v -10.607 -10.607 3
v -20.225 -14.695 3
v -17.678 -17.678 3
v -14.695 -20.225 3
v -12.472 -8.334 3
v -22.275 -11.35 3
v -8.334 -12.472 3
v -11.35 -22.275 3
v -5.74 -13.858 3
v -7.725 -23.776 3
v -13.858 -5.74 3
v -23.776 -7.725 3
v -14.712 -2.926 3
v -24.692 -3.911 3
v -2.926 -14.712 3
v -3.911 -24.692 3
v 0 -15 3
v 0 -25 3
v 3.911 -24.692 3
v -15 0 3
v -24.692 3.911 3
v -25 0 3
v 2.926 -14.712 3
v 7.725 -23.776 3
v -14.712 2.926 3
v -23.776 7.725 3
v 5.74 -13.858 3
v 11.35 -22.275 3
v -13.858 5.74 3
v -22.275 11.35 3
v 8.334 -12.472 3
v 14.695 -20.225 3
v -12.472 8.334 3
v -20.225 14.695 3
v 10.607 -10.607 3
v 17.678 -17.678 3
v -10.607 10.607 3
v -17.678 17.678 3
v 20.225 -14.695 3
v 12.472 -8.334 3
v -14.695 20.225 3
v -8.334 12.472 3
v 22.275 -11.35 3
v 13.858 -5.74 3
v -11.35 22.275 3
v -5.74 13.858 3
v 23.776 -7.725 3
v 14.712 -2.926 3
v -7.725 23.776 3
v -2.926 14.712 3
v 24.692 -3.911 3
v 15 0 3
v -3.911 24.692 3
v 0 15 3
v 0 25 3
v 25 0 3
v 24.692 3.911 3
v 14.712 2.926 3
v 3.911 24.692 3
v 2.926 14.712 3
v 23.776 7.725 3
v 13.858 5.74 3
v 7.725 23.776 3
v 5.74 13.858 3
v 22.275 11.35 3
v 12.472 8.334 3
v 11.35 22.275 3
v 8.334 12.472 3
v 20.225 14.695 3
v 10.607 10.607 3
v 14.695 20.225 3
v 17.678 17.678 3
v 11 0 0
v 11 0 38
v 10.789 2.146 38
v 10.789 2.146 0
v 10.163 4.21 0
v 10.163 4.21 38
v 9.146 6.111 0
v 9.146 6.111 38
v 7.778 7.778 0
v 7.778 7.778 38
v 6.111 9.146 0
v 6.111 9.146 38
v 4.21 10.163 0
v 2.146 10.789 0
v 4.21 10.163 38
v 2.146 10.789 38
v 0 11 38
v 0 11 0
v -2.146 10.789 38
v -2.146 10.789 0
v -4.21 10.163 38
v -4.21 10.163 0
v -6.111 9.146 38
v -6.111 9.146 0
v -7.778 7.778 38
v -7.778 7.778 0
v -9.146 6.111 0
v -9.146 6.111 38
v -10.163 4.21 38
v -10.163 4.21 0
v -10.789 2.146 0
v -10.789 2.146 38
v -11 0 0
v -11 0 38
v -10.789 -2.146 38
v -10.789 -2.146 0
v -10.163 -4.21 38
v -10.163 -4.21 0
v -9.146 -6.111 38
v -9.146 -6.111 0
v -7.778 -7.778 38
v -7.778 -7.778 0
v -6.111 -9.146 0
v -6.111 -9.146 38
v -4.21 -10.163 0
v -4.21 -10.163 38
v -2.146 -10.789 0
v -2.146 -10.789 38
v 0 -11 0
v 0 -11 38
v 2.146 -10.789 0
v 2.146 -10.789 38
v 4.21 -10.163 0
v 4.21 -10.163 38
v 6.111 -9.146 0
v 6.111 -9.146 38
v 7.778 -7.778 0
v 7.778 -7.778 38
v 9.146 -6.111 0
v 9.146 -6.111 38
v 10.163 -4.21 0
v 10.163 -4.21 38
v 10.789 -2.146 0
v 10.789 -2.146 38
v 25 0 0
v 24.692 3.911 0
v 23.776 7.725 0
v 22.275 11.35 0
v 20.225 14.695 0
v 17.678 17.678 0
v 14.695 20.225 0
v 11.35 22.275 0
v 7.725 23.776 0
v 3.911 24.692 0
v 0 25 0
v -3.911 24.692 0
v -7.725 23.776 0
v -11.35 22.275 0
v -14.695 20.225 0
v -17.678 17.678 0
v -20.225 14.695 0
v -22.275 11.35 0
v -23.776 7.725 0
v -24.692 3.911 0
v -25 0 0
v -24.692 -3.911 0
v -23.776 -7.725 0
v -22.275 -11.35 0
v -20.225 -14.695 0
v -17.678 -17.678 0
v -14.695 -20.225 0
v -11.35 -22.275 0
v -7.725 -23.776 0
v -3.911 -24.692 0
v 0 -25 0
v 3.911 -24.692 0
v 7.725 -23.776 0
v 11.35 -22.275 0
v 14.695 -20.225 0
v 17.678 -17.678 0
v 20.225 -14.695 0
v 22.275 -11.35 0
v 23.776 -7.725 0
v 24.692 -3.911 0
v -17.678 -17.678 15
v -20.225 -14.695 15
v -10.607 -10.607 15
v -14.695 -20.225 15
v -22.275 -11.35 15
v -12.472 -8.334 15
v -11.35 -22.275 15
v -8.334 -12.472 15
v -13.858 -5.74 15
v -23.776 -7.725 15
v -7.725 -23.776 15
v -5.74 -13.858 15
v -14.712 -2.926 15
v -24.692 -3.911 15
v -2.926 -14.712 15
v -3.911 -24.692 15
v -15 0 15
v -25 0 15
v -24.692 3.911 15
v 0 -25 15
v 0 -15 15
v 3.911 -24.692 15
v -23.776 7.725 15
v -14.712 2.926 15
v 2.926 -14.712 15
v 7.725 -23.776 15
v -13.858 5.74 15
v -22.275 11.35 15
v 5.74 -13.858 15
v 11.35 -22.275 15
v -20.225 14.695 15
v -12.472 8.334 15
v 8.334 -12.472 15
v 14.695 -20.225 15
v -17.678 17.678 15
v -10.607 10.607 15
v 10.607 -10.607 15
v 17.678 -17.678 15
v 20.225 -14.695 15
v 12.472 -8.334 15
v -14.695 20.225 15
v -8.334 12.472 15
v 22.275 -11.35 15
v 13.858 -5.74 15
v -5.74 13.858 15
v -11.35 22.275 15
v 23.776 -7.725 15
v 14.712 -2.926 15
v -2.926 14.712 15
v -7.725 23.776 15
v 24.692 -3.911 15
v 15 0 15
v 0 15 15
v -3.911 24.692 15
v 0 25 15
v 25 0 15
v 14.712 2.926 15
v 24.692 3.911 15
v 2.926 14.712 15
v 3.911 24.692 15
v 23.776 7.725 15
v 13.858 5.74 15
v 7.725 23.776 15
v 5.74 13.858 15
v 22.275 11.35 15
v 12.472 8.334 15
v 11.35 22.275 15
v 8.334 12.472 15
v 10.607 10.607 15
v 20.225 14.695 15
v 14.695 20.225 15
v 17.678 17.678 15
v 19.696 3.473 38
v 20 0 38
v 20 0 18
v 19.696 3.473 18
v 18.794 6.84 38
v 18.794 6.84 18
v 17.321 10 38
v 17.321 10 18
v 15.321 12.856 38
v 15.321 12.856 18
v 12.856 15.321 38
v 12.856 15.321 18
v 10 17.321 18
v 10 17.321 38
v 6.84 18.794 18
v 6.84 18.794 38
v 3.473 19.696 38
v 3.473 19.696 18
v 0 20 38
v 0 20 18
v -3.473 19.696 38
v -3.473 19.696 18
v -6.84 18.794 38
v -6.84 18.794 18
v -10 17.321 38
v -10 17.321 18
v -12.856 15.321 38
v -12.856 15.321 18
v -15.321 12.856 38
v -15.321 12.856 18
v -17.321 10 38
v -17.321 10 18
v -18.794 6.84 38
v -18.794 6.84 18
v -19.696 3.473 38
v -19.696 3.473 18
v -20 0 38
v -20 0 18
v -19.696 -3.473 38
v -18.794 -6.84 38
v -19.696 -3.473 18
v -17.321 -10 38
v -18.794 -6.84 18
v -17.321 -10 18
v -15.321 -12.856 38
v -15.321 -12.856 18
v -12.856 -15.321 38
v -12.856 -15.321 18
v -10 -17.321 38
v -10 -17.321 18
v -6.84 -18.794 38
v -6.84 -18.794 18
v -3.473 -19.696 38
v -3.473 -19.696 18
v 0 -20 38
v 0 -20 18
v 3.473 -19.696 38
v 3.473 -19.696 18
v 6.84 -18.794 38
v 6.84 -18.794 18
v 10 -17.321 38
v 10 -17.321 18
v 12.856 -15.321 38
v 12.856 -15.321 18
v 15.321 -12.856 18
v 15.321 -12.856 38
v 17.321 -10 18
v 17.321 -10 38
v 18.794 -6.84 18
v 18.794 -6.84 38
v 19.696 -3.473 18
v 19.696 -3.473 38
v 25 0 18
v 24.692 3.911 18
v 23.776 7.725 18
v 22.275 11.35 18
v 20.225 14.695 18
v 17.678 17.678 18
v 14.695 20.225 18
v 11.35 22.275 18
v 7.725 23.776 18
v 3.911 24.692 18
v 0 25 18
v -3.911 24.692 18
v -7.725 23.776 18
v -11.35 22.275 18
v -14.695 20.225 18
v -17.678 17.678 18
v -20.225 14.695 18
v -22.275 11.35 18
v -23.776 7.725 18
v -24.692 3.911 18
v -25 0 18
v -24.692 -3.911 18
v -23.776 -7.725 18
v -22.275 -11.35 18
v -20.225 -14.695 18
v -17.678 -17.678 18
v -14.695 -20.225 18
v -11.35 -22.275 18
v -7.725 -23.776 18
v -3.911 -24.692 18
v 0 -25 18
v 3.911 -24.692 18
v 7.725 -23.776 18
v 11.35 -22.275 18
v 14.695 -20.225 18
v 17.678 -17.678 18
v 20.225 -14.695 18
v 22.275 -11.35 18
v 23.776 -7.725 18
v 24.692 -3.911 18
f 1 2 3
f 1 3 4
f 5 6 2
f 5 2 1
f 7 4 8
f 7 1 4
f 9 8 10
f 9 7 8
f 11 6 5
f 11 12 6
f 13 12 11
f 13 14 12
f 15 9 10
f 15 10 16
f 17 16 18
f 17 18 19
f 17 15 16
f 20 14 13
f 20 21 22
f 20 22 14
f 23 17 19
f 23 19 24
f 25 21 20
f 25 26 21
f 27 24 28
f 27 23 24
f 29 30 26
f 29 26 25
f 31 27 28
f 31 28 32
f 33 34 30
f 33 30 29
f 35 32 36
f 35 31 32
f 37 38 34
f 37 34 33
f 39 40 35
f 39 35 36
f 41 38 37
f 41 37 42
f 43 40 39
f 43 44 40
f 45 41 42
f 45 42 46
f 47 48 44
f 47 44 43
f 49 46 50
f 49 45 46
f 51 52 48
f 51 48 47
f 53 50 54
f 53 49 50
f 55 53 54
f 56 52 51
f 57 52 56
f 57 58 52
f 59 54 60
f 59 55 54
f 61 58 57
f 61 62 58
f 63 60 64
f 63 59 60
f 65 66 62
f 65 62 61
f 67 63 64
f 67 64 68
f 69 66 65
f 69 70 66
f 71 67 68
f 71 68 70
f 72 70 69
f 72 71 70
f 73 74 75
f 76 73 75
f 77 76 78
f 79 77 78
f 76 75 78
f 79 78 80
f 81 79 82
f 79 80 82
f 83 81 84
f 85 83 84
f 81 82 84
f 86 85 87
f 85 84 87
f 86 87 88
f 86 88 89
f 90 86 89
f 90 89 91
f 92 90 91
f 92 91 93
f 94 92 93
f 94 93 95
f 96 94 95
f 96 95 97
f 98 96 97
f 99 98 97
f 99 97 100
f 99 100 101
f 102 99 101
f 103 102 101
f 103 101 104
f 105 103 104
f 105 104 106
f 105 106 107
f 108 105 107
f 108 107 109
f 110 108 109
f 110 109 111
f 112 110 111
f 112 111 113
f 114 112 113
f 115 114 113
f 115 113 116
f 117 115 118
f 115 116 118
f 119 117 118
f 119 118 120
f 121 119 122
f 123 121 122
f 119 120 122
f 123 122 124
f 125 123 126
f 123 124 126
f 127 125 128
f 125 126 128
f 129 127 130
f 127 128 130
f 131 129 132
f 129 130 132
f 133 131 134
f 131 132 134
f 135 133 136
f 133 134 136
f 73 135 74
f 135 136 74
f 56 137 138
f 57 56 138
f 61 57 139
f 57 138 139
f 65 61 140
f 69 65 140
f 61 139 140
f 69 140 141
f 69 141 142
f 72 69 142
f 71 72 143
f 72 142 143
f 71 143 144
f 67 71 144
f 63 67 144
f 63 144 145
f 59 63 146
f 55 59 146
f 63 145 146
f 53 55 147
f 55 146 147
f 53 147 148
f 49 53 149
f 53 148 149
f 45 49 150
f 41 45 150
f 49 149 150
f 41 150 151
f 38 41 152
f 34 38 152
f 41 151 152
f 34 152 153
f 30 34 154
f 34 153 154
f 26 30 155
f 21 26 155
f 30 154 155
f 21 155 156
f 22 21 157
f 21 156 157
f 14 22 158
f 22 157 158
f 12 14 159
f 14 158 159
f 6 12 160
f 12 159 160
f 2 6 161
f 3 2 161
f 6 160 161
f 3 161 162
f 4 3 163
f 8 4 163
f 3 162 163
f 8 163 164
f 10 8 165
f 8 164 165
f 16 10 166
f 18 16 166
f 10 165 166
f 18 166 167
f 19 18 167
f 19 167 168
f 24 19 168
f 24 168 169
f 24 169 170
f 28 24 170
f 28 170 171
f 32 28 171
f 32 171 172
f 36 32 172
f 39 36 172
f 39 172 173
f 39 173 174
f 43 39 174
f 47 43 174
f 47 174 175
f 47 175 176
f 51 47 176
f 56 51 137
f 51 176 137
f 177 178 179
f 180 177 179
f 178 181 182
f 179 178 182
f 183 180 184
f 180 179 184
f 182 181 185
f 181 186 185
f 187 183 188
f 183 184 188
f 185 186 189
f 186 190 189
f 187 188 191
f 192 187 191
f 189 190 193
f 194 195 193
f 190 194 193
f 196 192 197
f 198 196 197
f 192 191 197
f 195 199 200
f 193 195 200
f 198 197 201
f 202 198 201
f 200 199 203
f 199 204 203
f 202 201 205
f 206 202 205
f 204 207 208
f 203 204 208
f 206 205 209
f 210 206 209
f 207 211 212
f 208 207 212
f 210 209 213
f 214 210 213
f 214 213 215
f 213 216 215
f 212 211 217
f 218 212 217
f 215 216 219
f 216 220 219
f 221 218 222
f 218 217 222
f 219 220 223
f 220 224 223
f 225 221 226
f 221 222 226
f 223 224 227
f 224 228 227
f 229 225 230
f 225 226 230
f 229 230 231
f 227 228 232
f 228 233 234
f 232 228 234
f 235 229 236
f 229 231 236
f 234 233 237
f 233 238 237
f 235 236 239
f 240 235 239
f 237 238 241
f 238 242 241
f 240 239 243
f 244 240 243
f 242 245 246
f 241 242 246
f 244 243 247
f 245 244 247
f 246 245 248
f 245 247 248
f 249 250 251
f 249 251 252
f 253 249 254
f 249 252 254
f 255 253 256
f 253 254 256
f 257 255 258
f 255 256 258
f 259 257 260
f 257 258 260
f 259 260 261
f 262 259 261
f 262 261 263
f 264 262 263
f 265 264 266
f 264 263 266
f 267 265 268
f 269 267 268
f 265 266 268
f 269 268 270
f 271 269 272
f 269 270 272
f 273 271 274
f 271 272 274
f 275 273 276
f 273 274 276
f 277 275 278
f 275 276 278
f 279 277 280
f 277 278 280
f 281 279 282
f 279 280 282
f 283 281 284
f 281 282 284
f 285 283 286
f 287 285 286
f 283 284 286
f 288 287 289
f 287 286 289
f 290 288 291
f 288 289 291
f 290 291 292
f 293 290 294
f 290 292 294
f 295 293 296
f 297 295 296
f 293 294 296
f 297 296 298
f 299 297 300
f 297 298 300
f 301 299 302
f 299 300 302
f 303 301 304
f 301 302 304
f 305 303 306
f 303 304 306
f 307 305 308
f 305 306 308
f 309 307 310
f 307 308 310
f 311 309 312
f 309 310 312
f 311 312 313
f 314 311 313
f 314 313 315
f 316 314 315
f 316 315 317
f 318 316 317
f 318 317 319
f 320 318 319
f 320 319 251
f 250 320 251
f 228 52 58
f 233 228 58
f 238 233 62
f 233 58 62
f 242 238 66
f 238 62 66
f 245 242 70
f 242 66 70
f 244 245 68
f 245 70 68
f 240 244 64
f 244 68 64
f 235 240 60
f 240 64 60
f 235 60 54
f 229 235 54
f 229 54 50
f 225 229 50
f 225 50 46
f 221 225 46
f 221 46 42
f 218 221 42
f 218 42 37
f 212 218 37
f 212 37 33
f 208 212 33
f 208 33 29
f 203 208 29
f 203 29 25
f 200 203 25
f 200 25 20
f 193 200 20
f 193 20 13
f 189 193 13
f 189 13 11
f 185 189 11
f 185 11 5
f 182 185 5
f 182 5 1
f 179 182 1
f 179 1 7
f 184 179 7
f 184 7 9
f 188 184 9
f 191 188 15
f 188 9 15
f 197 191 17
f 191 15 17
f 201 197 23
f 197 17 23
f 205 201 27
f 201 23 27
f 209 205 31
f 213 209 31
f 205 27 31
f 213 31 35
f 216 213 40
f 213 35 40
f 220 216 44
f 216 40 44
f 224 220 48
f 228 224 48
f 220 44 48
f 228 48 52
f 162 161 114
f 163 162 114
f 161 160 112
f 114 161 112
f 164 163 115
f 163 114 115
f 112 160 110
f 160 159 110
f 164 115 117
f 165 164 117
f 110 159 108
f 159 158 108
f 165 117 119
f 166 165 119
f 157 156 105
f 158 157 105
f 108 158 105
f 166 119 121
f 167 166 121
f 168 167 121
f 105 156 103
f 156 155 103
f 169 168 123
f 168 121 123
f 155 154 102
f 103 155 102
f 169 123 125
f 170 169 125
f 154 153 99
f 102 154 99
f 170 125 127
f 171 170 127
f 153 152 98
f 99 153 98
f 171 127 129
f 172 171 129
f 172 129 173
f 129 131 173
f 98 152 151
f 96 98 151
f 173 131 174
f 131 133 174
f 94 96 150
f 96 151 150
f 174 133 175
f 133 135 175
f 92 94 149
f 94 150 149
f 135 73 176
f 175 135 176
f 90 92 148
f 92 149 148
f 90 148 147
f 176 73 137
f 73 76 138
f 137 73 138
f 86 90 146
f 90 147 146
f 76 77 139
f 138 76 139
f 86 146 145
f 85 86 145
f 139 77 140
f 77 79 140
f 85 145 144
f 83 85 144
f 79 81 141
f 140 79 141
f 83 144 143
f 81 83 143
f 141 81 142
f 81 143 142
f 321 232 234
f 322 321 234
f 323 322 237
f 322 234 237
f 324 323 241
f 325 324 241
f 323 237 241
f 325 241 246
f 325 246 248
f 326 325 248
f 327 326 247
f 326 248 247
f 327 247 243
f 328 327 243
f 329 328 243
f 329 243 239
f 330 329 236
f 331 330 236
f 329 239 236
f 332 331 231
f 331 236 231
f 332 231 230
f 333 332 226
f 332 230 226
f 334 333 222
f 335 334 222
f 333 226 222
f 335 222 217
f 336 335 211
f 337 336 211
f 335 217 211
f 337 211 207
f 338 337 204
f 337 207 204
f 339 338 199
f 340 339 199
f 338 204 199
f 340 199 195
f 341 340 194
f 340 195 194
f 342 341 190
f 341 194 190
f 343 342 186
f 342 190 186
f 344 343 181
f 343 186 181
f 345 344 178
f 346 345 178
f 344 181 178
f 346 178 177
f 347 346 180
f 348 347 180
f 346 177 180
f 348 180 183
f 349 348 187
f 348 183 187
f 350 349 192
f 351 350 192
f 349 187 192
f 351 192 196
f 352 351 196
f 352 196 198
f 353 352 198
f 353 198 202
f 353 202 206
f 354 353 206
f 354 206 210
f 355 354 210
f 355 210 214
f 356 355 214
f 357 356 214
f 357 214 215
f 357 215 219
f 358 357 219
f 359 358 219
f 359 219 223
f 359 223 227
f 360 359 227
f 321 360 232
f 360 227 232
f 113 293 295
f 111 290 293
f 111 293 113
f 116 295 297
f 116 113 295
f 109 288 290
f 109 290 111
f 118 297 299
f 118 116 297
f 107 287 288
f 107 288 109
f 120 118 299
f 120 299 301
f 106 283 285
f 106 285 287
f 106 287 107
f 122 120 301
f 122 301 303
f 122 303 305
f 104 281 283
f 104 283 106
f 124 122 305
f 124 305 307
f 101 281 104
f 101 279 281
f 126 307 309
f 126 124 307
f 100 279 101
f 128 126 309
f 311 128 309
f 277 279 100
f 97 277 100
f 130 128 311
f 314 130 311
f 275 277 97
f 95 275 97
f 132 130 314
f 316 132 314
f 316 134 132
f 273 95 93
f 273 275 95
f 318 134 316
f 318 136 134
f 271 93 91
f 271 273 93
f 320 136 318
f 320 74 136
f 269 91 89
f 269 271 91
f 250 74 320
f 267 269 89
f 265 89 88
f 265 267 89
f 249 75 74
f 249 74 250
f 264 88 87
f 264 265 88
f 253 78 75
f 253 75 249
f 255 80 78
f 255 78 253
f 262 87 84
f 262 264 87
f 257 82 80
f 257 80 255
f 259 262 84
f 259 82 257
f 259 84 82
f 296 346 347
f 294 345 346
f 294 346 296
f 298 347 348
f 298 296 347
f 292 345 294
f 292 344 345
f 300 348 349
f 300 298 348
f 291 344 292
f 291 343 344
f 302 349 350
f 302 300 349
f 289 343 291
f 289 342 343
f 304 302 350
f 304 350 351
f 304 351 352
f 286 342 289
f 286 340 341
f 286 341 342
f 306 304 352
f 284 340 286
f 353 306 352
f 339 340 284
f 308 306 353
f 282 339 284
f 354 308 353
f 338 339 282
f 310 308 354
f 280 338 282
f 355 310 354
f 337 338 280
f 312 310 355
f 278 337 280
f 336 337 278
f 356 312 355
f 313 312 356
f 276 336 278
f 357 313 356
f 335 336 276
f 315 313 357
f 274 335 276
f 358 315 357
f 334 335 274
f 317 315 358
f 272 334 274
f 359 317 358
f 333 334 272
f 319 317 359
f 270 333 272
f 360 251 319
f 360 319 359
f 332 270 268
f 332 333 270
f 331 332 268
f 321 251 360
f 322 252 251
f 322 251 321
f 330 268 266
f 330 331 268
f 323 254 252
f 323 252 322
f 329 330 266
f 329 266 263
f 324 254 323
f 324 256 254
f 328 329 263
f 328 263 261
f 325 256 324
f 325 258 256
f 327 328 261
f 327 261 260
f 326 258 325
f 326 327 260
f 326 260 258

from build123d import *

# Parameters (mm, degrees)
SKETCH1_R           = 25
BOSS_EXTRUDE1_DEPTH = 3
SKETCH2_R           = 15
BOSS_EXTRUDE2_DEPTH = 15
SKETCH3_R           = 25
BOSS_EXTRUDE3_DEPTH = 3
SKETCH4_R           = 20
BOSS_EXTRUDE4_DEPTH = 20
SKETCH5_R           = 11
CUT_EXTRUDE1_DEPTH  = 50


with BuildPart() as part:
    # Sketch1 → Boss-Extrude1 (new body)
    with BuildSketch(Plane.XY):
        Circle(SKETCH1_R)
    extrude(amount=BOSS_EXTRUDE1_DEPTH)

    # Sketch2 → Boss-Extrude2 (add)
    with BuildSketch(Plane.XY):
        Circle(SKETCH2_R)
    extrude(amount=BOSS_EXTRUDE2_DEPTH)

    # Sketch3 → Boss-Extrude3 (add)
    with BuildSketch(Plane.XY.offset(15)):
        Circle(SKETCH3_R)
    extrude(amount=BOSS_EXTRUDE3_DEPTH)

    # Sketch4 → Boss-Extrude4 (add)
    with BuildSketch(Plane.XY.offset(18)):
        Circle(SKETCH4_R)
    extrude(amount=BOSS_EXTRUDE4_DEPTH)

    # Sketch5 → Cut-Extrude1 (cut)
    with BuildSketch(Plane.XY.offset(38)):
        Circle(SKETCH5_R)
    extrude(amount=-CUT_EXTRUDE1_DEPTH, mode=Mode.SUBTRACT)


solid = part.part
